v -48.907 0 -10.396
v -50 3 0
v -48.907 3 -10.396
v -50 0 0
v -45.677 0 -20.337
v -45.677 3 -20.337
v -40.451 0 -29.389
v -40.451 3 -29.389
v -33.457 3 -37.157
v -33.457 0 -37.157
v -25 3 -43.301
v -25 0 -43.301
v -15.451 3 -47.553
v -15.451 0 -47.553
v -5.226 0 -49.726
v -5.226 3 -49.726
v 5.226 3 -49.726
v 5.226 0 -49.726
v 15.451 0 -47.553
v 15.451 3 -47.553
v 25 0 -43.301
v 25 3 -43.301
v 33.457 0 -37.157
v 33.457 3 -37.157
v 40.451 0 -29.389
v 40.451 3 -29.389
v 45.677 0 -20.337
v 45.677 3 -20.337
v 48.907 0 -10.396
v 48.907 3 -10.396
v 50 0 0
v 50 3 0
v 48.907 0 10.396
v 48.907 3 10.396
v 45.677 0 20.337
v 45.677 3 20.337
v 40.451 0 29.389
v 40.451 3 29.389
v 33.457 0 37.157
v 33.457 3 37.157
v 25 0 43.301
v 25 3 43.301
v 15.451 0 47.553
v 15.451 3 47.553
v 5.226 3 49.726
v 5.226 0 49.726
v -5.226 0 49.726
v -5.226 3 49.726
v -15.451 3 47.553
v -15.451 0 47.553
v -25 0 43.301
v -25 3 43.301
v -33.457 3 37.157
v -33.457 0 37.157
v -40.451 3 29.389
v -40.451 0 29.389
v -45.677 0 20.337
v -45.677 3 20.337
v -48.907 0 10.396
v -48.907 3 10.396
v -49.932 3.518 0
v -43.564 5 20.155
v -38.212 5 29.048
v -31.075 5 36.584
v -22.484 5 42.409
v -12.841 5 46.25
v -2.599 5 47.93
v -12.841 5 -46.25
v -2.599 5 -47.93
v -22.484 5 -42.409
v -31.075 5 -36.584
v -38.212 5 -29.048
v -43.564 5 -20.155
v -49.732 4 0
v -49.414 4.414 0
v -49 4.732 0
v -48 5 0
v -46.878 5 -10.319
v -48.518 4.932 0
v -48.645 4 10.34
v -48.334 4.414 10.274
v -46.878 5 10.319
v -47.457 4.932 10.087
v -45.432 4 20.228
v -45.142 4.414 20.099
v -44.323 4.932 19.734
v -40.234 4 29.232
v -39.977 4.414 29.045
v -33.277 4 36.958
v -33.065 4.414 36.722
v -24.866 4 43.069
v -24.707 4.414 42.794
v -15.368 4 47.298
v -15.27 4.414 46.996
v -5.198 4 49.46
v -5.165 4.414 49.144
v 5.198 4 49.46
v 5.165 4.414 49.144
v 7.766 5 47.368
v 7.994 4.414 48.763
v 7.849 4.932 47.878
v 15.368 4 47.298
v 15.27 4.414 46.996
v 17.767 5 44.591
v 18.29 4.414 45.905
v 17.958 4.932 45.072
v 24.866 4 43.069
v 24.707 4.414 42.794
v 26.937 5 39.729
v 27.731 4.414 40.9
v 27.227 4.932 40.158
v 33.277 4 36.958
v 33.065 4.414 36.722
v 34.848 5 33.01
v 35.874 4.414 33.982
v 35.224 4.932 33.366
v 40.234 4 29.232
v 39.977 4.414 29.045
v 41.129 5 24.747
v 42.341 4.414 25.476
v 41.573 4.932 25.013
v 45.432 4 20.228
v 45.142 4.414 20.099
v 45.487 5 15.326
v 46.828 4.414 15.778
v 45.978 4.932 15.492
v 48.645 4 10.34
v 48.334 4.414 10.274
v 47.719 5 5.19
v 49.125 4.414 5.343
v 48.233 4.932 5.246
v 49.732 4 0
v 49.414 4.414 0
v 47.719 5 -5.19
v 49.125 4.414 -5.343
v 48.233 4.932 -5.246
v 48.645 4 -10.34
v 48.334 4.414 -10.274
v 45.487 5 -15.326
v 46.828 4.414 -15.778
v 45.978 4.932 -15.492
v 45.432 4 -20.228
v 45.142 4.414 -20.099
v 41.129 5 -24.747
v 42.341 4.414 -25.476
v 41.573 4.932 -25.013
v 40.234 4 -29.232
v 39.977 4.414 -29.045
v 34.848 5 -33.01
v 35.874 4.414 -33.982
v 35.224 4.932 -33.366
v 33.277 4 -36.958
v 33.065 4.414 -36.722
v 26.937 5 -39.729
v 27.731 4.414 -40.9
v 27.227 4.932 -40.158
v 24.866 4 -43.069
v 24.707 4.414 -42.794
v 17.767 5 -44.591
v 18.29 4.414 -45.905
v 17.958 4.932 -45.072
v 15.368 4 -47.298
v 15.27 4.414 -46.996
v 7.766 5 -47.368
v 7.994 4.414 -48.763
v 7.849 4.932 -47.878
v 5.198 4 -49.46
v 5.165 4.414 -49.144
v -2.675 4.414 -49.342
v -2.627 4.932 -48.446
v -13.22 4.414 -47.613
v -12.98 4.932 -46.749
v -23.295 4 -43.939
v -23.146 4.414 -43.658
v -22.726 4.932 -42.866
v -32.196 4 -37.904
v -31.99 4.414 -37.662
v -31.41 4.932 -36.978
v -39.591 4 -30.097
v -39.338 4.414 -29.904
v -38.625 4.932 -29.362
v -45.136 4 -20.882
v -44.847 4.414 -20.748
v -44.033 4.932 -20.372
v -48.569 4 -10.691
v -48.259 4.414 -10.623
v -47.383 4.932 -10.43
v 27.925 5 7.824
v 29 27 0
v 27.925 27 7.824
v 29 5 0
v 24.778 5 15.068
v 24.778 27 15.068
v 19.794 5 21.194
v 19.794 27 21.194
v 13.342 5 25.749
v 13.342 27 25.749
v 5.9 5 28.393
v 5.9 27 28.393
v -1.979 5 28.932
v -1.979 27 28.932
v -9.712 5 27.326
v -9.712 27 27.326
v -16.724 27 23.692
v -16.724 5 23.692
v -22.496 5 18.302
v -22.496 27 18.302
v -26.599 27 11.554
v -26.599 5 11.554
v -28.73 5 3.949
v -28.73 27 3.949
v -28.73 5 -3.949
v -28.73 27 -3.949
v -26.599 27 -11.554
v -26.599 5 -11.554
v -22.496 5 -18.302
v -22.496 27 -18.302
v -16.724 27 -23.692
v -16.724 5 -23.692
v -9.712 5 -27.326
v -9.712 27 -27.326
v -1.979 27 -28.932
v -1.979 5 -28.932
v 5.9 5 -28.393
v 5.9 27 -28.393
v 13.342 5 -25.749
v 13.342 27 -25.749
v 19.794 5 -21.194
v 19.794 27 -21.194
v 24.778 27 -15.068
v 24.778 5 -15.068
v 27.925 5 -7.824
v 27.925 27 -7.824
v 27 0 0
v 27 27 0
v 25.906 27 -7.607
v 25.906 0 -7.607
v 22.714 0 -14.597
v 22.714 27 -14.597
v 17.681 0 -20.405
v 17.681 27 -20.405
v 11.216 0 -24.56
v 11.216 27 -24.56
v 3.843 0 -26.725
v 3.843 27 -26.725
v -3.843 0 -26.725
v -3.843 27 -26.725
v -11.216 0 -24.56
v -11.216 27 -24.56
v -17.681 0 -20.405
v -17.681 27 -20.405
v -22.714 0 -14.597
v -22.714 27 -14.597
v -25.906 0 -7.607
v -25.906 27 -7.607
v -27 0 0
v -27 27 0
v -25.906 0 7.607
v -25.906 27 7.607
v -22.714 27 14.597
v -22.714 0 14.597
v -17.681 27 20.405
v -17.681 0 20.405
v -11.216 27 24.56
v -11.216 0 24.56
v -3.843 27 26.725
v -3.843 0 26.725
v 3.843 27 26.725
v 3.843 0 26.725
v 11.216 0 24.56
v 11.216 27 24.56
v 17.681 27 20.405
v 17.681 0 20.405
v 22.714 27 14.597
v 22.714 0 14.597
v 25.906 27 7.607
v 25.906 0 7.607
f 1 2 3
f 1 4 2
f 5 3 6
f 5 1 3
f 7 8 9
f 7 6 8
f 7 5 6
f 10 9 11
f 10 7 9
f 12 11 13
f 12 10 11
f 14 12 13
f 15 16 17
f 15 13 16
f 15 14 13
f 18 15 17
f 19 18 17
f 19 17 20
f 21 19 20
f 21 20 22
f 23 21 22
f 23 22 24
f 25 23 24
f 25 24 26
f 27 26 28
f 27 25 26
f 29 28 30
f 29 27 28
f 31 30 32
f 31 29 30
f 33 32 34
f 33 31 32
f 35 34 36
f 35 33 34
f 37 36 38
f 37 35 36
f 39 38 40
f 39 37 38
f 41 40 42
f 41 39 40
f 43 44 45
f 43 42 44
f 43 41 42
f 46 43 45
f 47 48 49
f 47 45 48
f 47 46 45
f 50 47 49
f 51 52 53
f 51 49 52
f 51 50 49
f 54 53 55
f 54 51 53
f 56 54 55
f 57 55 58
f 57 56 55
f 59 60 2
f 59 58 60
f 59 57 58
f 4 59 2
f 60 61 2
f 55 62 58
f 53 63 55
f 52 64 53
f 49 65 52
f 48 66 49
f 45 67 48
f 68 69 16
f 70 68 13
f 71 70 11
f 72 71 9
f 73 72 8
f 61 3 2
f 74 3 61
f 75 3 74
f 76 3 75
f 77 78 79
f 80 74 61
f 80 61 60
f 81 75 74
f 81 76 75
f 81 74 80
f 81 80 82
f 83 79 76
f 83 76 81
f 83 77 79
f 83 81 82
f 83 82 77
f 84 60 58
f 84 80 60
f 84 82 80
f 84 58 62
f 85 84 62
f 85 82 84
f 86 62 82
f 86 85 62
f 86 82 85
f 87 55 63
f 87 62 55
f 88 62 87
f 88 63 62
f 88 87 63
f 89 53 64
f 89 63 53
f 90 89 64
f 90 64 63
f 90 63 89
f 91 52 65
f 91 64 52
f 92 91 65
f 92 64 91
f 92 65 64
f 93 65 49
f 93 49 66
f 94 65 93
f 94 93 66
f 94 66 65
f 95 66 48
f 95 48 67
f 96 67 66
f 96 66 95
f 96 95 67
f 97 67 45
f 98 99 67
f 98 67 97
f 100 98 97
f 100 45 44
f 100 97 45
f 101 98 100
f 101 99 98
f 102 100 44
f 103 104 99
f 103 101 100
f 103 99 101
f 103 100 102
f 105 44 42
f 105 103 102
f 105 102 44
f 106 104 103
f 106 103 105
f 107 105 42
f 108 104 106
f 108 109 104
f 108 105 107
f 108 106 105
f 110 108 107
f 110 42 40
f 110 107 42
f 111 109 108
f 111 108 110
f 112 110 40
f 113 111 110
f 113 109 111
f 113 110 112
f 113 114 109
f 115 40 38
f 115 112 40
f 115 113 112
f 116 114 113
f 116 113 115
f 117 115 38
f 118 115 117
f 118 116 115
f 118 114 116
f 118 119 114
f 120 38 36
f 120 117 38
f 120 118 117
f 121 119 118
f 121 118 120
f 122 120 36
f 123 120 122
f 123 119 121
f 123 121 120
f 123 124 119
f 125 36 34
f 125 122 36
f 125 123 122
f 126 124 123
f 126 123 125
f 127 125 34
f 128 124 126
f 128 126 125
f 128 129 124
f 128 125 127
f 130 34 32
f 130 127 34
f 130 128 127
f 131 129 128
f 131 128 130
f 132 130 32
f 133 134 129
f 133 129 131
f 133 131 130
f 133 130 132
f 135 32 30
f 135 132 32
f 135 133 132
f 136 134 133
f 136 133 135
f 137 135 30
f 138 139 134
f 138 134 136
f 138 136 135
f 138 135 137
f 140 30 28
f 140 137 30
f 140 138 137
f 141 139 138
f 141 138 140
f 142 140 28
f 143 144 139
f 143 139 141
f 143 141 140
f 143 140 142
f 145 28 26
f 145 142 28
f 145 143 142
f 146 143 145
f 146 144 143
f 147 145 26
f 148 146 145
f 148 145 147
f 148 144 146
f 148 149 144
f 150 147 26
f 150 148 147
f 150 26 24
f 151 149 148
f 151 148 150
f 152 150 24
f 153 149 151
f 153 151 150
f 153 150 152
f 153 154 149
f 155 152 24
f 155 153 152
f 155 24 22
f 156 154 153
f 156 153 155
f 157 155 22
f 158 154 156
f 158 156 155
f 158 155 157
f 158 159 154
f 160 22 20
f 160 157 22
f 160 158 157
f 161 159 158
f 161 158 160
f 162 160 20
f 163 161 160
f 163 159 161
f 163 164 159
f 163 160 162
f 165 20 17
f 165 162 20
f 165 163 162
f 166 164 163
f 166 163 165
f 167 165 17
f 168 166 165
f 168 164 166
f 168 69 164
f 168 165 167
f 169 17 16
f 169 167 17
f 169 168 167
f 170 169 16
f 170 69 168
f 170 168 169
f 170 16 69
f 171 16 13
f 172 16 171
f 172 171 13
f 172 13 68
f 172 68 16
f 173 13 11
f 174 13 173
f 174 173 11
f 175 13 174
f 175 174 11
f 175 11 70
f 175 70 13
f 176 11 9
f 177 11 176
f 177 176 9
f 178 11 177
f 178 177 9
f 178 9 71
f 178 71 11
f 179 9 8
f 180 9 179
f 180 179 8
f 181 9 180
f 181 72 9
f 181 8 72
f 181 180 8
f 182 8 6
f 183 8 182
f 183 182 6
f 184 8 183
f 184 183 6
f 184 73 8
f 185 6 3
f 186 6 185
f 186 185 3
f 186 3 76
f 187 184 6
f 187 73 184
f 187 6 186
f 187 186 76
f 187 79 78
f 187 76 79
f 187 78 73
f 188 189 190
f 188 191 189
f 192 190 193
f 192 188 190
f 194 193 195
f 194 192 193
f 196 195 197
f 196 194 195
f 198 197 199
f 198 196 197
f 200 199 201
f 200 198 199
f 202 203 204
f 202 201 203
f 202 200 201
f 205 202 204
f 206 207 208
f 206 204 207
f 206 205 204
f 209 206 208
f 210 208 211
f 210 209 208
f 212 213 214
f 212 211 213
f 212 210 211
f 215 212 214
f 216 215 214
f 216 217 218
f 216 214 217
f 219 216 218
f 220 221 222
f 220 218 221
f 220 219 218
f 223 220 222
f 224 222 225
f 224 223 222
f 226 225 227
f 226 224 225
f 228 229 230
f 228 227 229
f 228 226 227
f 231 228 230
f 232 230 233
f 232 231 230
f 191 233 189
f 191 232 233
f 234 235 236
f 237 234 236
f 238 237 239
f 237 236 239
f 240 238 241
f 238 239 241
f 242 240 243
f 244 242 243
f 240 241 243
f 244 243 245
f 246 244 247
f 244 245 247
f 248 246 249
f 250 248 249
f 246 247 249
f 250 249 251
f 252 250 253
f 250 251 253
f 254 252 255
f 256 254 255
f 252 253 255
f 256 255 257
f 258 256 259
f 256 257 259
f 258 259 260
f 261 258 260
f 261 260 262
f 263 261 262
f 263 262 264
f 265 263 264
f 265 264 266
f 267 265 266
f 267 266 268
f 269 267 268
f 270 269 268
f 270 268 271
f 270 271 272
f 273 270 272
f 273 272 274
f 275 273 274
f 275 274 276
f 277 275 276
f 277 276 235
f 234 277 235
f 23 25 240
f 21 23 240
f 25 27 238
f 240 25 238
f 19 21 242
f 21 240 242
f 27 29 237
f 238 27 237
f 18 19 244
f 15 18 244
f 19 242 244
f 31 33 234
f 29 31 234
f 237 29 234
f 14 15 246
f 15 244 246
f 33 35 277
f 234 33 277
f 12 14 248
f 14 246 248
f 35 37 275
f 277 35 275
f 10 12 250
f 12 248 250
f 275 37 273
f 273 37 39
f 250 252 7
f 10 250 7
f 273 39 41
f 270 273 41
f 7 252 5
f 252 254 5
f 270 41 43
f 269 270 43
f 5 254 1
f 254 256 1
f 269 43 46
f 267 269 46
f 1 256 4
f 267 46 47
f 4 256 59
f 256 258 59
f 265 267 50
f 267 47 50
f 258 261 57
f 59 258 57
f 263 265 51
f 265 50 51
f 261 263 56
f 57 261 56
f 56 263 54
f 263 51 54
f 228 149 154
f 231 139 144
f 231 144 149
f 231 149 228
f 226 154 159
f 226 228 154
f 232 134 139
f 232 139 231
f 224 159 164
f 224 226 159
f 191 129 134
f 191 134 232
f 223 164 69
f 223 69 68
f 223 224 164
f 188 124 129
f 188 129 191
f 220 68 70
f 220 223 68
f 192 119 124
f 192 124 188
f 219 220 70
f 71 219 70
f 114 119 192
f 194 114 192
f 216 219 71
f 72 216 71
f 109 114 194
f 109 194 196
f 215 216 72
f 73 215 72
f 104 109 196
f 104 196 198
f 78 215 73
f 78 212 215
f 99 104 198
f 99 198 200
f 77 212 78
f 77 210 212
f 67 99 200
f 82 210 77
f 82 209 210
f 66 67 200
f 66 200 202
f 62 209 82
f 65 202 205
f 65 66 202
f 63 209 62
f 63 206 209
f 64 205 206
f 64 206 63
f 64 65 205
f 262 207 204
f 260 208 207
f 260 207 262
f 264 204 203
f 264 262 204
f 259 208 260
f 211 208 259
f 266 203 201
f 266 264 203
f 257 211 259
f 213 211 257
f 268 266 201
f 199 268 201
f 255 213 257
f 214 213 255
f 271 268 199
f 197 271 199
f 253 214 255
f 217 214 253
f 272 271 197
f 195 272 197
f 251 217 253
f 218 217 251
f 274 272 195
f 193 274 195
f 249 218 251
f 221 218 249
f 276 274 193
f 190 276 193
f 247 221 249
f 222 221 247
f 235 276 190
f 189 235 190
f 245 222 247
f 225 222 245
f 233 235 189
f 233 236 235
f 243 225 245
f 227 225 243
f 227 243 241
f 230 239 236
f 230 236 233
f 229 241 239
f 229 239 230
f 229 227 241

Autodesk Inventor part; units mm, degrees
ref_plane "YZ Plane" through (0, 0, 0) normal (1, 0, 0) x (0, 1, 0)
ref_plane "XZ Plane" through (0, 0, 0) normal (0, 1, 0) x (-1, 0, 0)
ref_plane "XY Plane" through (0, 0, 0) normal (0, 0, 1) x (1, 0, 0)
sketch "Sketch1" plane through (0, 0, 0) normal (0, 1, 0) x (-1, 0, 0)
  circle A0 centre (0, 0) radius 50
  dimension "d0" = 100
extrude "Extrusion1" add sketch "Sketch1" along normal blind 5
sketch "Sketch2" plane through (0, 5, 0) normal (0, 1, 0) x (1, 0, 0)
  circle A0 centre (0, 0) radius 29
  dimension "d3" = 58
extrude "Extrusion2" add sketch "Sketch2" along normal blind 22
thread "Thread1" size "M58x3" class "6g" standard "ANSI Metric M Profile" full length
fillet "Fillet1" radius 2 1 edges at (50, 5, 0)
sketch "Sketch3" plane through (0, 27, 0) normal (0, 1, 0) x (1, 0, 0)
  circle A0 centre (0, 0) radius 27
  dimension "d9" = 54
extrude "Extrusion3" cut sketch "Sketch3" against normal blind 100
properties part number "palmPlatform"
